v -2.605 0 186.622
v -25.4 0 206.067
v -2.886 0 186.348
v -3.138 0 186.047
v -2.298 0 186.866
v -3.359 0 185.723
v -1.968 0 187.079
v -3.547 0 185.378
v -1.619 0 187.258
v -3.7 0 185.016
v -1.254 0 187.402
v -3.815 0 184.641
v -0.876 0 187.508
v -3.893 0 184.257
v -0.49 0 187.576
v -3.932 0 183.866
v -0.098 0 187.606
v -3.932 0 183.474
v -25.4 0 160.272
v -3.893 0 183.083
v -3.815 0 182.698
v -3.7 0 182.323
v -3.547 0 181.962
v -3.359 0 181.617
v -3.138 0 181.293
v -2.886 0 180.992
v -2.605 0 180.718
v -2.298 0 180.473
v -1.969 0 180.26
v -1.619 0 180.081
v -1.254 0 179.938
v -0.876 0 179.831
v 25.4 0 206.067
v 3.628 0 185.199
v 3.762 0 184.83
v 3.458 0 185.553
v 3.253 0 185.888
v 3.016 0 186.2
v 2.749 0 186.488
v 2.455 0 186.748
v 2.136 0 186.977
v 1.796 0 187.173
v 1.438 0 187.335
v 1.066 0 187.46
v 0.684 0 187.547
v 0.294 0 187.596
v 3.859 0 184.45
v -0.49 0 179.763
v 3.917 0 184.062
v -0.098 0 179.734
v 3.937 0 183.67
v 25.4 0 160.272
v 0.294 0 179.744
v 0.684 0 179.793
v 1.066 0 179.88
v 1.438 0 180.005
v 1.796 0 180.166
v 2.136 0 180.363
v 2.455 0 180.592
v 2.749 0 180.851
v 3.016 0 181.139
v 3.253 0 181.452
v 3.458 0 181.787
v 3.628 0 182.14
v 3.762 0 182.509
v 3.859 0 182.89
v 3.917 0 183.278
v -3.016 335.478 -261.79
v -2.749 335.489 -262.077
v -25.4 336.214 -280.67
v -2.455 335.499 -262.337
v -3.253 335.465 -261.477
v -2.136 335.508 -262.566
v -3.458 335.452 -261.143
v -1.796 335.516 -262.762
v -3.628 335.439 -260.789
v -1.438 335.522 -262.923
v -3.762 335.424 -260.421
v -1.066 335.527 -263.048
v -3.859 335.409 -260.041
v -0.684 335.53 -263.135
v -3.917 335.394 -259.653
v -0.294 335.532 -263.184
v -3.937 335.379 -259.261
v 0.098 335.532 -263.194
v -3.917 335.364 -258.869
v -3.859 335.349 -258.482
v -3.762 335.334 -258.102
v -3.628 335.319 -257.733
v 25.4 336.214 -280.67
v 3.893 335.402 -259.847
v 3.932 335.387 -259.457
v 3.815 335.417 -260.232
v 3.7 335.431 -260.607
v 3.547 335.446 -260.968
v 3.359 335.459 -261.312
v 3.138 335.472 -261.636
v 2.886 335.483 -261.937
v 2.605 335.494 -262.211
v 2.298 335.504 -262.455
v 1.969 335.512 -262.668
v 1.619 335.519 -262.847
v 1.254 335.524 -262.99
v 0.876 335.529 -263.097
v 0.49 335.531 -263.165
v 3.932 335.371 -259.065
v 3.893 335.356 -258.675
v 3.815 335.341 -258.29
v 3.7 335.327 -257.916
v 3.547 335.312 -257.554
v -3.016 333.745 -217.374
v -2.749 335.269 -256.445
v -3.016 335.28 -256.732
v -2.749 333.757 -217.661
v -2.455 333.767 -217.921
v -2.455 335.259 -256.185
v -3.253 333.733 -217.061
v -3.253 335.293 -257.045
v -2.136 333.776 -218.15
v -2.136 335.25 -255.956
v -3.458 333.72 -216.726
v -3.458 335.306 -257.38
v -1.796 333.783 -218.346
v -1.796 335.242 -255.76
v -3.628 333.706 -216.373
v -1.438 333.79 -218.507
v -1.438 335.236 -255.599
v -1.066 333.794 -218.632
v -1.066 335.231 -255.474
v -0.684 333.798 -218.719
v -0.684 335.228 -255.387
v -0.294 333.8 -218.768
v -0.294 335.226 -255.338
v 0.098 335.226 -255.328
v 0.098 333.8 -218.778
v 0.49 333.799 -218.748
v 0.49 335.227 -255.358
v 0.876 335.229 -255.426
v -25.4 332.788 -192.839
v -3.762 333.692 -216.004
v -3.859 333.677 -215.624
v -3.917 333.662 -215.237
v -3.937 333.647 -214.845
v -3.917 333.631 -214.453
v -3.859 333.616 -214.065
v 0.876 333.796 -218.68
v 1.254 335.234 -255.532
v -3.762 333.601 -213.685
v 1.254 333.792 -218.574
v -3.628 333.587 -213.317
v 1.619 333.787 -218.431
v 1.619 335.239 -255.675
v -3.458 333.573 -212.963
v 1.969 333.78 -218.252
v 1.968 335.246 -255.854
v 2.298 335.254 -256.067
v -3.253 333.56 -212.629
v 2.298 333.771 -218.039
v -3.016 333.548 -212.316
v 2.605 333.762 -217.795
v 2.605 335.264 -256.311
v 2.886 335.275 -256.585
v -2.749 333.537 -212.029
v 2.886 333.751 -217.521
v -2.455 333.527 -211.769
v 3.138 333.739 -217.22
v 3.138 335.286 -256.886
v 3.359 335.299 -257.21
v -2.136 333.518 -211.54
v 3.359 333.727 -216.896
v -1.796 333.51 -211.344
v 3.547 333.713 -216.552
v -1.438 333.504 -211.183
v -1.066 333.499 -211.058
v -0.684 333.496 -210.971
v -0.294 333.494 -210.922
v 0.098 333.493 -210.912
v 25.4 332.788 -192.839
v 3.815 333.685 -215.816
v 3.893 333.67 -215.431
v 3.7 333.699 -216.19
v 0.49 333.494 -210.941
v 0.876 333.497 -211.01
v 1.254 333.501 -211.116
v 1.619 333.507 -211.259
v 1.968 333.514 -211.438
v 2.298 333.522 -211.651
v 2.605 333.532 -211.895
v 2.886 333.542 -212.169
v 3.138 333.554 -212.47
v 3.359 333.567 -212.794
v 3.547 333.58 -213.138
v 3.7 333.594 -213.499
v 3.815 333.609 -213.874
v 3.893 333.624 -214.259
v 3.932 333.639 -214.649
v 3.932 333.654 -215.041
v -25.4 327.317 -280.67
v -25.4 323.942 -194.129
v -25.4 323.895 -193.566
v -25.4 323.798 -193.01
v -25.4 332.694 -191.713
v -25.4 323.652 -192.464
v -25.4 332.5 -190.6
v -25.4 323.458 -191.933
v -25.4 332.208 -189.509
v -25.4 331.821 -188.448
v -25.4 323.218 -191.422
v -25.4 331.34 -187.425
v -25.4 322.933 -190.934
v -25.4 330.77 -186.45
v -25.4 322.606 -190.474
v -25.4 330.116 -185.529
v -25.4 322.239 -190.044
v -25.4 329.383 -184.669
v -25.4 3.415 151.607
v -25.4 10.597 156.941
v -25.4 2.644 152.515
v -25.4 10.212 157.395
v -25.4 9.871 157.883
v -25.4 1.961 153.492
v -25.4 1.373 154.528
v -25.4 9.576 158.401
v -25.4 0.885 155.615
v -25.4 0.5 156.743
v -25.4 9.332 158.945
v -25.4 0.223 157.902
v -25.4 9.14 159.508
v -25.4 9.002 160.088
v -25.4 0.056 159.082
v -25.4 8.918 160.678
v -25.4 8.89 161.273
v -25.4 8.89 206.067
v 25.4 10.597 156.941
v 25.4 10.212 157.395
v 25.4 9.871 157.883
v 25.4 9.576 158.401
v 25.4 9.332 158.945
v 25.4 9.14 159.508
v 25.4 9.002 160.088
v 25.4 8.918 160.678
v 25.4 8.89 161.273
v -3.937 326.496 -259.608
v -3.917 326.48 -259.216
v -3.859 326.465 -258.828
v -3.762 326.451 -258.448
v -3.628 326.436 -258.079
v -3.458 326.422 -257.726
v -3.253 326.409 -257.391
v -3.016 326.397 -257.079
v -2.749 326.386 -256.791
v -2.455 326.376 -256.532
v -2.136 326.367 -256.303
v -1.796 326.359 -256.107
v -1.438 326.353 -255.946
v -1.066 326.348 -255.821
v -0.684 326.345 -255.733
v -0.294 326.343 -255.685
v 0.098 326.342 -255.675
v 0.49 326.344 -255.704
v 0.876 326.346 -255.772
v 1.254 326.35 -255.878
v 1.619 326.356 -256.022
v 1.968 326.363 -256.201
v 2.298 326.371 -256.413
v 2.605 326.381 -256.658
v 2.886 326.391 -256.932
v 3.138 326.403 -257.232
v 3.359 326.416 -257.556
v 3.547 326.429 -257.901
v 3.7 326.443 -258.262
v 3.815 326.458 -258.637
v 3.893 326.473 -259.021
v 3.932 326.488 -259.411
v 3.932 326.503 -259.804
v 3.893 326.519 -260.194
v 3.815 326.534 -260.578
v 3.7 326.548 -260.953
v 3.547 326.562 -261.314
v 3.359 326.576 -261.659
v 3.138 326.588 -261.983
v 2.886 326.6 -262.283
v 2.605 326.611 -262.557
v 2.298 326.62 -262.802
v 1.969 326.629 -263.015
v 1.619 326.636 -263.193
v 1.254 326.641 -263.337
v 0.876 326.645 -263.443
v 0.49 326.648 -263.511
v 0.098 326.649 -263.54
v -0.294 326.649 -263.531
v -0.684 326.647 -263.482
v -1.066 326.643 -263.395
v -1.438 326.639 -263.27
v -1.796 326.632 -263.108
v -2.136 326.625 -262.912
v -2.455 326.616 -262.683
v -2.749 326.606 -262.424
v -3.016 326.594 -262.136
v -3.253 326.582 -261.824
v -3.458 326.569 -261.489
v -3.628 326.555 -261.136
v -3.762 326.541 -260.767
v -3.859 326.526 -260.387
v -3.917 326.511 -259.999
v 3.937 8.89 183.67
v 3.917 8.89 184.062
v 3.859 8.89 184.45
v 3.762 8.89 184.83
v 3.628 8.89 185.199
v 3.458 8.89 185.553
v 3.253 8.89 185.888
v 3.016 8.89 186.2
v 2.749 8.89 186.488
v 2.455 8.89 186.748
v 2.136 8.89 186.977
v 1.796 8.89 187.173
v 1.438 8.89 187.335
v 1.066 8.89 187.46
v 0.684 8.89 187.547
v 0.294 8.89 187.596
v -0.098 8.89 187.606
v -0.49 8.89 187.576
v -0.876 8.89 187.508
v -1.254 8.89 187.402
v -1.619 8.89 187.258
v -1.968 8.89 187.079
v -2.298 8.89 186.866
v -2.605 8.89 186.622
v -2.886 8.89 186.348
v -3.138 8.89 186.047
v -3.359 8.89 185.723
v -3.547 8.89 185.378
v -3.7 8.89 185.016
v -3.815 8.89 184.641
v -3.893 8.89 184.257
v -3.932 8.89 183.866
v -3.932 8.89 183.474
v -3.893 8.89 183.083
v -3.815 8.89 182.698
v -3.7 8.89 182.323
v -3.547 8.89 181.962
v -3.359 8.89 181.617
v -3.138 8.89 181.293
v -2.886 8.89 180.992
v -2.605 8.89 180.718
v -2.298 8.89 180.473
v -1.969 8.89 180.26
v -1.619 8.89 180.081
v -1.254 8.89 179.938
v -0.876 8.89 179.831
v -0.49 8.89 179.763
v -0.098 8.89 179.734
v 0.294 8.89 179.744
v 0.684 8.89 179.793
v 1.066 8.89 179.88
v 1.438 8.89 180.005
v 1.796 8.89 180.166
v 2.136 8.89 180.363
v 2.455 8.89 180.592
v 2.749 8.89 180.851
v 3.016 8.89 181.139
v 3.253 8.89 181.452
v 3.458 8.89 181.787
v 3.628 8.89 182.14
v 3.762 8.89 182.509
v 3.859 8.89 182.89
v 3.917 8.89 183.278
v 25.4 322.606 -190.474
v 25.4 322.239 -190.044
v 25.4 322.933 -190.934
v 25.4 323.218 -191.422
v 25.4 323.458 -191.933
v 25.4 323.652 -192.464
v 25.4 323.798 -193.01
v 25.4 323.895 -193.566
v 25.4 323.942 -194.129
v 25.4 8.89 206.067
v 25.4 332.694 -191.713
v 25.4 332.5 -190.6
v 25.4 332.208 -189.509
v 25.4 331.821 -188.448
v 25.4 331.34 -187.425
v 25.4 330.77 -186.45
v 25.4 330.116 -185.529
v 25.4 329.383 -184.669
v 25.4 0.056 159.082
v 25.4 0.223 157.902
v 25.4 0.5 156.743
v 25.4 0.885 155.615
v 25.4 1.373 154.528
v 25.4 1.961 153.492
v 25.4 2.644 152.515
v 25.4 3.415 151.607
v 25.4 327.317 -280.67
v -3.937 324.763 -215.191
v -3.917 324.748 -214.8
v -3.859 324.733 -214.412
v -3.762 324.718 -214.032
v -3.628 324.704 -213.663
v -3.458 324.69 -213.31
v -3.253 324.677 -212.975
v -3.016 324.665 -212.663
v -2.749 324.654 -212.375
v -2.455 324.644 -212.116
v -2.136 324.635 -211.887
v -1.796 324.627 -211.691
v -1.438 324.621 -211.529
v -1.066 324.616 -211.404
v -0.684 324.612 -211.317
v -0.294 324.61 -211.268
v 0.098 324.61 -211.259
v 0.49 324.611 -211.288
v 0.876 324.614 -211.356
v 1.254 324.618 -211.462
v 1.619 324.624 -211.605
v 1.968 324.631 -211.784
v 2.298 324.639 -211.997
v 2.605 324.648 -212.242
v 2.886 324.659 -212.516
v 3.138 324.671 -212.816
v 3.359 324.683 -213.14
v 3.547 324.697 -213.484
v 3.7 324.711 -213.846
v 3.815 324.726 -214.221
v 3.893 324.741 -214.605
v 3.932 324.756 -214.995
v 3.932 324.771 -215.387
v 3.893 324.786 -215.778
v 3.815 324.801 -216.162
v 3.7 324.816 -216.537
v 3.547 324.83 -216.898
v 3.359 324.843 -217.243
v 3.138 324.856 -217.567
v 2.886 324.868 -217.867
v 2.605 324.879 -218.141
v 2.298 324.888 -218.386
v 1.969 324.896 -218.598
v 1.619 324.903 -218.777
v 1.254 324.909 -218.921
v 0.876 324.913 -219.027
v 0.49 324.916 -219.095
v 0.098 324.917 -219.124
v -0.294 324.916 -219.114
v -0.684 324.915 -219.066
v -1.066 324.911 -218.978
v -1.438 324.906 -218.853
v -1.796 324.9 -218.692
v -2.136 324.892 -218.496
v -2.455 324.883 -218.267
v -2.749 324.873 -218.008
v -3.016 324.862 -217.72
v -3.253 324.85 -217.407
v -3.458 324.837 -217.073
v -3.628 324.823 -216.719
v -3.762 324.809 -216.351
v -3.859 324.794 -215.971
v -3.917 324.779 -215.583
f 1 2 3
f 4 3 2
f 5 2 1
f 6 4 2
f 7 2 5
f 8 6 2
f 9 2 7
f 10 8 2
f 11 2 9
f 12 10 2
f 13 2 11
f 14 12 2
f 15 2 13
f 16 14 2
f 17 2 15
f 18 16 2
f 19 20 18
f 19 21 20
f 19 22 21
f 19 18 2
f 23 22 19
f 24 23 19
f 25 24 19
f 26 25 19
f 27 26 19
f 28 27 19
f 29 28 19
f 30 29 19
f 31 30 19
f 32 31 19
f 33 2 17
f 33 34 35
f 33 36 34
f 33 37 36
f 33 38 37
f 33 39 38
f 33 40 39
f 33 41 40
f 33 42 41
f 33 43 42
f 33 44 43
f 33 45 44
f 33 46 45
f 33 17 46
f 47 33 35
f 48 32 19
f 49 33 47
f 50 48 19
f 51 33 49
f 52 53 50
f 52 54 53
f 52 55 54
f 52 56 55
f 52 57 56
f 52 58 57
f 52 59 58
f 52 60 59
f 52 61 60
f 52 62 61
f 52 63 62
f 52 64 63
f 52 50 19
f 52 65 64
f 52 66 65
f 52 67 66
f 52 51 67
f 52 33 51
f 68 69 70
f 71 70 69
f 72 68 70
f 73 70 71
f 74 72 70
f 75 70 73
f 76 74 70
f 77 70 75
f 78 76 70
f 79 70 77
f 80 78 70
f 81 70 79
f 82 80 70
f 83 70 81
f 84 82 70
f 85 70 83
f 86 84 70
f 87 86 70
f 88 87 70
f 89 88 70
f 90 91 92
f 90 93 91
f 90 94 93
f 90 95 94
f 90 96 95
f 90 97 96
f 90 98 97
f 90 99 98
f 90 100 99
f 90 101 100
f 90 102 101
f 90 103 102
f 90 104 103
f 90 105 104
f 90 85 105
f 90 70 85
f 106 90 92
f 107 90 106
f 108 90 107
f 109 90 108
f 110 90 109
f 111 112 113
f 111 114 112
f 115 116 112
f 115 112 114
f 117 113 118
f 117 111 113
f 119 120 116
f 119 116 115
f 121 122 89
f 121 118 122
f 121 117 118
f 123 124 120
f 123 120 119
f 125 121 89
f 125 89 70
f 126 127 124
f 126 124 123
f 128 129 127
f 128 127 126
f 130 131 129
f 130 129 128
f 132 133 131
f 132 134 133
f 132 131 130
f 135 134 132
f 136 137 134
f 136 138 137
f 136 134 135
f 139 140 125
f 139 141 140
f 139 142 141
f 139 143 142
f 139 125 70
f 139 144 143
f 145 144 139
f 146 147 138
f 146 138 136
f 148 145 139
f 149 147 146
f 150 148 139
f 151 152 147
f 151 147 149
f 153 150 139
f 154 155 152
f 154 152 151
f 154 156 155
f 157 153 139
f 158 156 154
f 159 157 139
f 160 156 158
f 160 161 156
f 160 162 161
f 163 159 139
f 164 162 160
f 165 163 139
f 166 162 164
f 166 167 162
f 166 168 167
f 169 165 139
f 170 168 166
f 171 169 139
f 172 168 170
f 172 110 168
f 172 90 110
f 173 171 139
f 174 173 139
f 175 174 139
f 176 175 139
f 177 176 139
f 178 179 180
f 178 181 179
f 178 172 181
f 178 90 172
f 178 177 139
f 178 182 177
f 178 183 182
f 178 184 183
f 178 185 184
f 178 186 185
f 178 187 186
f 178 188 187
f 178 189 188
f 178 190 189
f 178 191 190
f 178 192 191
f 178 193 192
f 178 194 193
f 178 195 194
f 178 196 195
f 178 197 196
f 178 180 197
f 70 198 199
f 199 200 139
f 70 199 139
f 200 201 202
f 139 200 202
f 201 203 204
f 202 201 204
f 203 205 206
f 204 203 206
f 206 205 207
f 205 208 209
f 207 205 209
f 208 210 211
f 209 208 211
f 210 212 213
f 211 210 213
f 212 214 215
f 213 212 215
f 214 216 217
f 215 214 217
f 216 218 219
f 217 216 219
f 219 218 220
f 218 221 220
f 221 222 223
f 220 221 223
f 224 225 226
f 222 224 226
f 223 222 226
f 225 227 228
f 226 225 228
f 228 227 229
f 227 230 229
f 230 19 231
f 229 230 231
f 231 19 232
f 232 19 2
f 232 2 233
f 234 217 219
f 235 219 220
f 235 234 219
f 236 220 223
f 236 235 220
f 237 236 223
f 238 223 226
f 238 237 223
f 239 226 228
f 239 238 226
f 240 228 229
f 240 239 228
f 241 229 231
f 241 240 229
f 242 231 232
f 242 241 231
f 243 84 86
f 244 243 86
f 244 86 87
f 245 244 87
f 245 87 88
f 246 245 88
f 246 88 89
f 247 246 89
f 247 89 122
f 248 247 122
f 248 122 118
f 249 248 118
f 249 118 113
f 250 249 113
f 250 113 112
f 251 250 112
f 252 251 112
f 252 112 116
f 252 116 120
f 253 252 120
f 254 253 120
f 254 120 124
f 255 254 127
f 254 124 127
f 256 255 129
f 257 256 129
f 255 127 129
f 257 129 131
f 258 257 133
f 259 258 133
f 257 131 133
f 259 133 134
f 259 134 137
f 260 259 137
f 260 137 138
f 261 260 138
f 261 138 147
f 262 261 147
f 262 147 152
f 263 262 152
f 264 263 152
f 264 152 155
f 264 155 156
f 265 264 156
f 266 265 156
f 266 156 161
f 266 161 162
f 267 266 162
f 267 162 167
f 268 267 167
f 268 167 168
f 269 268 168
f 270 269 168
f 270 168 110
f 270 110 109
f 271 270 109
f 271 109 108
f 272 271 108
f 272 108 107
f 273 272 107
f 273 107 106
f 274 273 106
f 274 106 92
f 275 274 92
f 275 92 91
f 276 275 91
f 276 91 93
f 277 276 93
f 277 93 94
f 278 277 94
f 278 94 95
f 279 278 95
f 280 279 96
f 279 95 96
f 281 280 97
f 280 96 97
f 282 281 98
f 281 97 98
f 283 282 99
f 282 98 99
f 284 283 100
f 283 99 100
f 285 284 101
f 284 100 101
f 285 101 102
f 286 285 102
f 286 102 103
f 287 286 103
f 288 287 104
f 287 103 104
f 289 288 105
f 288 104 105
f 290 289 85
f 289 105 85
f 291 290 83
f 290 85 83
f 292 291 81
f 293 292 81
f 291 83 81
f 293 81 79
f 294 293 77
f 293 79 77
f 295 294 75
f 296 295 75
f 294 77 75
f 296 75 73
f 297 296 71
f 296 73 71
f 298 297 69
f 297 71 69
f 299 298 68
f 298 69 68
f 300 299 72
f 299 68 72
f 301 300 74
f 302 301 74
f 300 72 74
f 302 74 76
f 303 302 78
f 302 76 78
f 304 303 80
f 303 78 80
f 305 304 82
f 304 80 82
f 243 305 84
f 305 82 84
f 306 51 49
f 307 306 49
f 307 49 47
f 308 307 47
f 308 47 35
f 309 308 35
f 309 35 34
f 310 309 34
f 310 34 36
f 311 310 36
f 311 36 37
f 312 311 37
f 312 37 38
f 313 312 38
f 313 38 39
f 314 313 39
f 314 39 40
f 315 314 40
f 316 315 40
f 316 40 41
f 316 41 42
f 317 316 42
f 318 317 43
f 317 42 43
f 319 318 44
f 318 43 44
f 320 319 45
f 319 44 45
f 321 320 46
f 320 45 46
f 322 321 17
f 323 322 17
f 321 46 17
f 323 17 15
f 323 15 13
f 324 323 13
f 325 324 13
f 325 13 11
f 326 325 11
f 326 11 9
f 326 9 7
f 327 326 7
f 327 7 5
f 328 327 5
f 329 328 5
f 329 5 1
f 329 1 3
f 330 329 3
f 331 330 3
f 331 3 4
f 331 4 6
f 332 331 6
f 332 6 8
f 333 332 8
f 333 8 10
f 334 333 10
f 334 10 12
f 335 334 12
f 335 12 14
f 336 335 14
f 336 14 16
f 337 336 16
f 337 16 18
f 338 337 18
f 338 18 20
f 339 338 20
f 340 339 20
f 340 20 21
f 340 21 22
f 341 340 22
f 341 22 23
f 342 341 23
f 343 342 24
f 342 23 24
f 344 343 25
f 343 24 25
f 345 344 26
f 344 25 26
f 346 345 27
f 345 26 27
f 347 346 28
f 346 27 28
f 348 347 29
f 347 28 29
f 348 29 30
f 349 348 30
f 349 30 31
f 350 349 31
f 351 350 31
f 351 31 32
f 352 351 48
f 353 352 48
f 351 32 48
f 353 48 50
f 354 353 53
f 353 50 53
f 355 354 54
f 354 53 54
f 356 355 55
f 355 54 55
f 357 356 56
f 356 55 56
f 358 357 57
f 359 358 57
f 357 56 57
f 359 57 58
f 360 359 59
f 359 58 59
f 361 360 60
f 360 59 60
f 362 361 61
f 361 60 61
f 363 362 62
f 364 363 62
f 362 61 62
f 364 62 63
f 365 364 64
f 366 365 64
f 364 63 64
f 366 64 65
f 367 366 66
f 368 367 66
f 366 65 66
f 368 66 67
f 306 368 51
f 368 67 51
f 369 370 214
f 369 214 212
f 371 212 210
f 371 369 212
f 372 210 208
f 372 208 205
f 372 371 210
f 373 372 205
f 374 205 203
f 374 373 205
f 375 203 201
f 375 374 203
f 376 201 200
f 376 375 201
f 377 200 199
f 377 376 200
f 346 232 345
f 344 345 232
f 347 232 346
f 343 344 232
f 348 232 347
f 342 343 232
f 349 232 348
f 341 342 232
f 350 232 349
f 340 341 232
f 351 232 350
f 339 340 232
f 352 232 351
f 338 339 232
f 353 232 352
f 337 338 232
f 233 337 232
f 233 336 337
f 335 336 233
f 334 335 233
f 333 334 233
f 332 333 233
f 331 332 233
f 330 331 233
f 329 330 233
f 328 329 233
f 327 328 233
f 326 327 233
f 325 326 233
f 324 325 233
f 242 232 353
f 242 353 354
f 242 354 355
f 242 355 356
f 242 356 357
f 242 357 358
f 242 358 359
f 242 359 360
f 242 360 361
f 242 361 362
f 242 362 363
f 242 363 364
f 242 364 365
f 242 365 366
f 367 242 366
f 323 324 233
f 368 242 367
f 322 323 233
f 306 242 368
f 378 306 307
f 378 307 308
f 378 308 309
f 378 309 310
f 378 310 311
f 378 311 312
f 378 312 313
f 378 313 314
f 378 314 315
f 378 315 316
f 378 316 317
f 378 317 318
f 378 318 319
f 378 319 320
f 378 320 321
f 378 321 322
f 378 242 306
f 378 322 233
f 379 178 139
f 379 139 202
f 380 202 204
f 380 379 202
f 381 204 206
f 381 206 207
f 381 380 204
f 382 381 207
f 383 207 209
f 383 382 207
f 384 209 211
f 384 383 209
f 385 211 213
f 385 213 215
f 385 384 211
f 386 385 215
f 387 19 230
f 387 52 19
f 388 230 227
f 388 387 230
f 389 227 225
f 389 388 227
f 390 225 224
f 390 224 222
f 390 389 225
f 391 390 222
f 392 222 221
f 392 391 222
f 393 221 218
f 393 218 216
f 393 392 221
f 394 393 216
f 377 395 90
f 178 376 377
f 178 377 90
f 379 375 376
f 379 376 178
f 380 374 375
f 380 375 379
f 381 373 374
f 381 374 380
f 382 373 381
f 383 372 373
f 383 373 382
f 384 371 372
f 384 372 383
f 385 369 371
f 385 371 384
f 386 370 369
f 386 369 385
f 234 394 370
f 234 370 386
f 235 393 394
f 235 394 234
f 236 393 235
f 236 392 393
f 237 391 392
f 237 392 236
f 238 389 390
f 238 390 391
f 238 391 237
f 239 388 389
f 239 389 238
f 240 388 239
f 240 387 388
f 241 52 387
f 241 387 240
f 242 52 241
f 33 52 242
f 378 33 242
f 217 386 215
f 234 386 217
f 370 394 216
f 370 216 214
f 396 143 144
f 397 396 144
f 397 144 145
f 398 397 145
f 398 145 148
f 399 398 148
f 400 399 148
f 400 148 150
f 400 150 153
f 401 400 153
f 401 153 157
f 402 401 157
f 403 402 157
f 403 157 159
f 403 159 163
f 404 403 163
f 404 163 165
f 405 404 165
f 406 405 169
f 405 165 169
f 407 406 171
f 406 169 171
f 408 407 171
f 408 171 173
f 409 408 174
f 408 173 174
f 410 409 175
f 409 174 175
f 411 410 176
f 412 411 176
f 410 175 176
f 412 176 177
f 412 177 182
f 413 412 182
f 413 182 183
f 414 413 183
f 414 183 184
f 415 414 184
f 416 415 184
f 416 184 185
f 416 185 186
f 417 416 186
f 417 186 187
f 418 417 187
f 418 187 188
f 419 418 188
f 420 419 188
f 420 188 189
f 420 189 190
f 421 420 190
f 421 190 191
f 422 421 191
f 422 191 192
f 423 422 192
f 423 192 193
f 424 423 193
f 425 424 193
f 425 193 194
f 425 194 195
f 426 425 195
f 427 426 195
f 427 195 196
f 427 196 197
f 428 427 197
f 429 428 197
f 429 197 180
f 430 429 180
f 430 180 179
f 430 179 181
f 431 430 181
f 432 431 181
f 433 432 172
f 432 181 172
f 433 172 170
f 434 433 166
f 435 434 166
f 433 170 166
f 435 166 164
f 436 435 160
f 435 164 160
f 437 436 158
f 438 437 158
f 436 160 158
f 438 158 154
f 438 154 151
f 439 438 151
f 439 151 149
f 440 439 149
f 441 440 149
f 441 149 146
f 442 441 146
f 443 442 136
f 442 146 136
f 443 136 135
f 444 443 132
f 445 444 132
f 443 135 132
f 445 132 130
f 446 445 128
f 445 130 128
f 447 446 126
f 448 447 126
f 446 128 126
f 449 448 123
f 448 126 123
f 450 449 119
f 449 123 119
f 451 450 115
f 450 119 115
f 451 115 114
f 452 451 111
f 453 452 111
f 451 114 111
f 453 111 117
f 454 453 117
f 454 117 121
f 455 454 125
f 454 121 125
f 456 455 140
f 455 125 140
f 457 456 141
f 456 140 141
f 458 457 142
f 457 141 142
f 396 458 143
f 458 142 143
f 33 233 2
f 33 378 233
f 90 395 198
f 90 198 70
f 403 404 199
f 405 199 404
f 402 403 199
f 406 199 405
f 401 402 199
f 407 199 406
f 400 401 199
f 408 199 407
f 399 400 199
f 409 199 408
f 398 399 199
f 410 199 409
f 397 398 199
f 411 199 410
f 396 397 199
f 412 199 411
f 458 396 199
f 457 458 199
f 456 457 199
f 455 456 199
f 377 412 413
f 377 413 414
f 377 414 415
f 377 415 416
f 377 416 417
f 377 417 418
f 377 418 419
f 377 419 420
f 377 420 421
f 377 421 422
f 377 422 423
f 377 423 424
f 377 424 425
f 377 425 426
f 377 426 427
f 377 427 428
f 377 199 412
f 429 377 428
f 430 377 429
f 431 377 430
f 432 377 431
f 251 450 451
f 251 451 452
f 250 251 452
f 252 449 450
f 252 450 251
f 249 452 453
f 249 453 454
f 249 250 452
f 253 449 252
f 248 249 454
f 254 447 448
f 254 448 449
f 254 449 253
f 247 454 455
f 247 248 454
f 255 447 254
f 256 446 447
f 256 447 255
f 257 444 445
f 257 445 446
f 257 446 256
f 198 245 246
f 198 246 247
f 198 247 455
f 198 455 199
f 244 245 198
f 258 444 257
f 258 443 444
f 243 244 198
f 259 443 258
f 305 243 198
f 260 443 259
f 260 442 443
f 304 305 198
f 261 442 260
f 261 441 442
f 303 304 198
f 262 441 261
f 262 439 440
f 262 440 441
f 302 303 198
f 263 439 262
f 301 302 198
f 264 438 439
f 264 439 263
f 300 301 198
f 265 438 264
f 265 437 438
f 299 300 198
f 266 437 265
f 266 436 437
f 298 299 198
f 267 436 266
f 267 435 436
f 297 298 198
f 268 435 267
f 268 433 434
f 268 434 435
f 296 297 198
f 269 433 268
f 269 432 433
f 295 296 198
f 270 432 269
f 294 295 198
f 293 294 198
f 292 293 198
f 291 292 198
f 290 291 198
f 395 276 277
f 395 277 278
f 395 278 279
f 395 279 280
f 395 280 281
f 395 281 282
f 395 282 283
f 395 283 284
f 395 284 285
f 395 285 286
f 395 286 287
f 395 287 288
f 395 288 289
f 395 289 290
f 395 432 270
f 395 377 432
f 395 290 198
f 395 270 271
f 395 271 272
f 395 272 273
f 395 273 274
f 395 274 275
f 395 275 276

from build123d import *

# Parameters (mm, degrees)
F1_DEPTH = 25.4
F3_D     = 7.874
F5_D     = 7.874


with BuildPart() as f1:
    # F0 (on Right) → F1 (new body, symmetric)
    with BuildSketch(Plane.YZ):
        with BuildLine():
            ThreePointArc((0, 160.2718698293), (0.8845331432, 155.615181848), (3.4149201504, 151.6071544741))
            Line((3.4149201504, 151.6071544741), (322.2393654787, -190.0440494609))
            ThreePointArc((322.2393654787, -190.0440494609), (323.4580585518, -191.9333664625), (323.9420015649, -194.1289371625))
            Line((323.9420015649, -194.1289371625), (327.3172136475, -280.67))
            Line((327.3172136475, -280.67), (336.2139723666, -280.67))
            Line((336.2139723666, -280.67), (332.7884473544, -192.8389043312))
            ThreePointArc((332.7884473544, -192.8389043312), (331.8205613281, -188.4477629311), (329.3831751819, -184.6691289279))
            Line((329.3831751819, -184.6691289279), (10.5974600752, 156.9405718319))
            ThreePointArc((10.5974600752, 156.9405718319), (9.3322665716, 158.9445855188), (8.89, 161.2729295095))
            Line((8.89, 161.2729295095), (8.89, 206.0665714286))
            Line((8.89, 206.0665714286), (0, 206.0665714286))
            Line((0, 206.0665714286), (0, 160.2718698293))
        make_face()
    extrude(amount=F1_DEPTH, both=True)

    # F3 (through all)
    with Locations(Plane(origin=(0, 8.89, 0), x_dir=(-1, 0, 0), z_dir=(0, 1, 0))):
        with Locations((0, 183.669750469)):
            Hole(F3_D / 2)

    # F5 (through all)
    with Locations(Plane(origin=(0, 315.8902243159, 12.3201225744), x_dir=(1, 0, 0), z_dir=(0, -0.9992403167, -0.0389716498))):
        with Locations((0, -227.6844431866), (0, -272.1344431866)):
            Hole(F5_D / 2)


solid = f1.part
